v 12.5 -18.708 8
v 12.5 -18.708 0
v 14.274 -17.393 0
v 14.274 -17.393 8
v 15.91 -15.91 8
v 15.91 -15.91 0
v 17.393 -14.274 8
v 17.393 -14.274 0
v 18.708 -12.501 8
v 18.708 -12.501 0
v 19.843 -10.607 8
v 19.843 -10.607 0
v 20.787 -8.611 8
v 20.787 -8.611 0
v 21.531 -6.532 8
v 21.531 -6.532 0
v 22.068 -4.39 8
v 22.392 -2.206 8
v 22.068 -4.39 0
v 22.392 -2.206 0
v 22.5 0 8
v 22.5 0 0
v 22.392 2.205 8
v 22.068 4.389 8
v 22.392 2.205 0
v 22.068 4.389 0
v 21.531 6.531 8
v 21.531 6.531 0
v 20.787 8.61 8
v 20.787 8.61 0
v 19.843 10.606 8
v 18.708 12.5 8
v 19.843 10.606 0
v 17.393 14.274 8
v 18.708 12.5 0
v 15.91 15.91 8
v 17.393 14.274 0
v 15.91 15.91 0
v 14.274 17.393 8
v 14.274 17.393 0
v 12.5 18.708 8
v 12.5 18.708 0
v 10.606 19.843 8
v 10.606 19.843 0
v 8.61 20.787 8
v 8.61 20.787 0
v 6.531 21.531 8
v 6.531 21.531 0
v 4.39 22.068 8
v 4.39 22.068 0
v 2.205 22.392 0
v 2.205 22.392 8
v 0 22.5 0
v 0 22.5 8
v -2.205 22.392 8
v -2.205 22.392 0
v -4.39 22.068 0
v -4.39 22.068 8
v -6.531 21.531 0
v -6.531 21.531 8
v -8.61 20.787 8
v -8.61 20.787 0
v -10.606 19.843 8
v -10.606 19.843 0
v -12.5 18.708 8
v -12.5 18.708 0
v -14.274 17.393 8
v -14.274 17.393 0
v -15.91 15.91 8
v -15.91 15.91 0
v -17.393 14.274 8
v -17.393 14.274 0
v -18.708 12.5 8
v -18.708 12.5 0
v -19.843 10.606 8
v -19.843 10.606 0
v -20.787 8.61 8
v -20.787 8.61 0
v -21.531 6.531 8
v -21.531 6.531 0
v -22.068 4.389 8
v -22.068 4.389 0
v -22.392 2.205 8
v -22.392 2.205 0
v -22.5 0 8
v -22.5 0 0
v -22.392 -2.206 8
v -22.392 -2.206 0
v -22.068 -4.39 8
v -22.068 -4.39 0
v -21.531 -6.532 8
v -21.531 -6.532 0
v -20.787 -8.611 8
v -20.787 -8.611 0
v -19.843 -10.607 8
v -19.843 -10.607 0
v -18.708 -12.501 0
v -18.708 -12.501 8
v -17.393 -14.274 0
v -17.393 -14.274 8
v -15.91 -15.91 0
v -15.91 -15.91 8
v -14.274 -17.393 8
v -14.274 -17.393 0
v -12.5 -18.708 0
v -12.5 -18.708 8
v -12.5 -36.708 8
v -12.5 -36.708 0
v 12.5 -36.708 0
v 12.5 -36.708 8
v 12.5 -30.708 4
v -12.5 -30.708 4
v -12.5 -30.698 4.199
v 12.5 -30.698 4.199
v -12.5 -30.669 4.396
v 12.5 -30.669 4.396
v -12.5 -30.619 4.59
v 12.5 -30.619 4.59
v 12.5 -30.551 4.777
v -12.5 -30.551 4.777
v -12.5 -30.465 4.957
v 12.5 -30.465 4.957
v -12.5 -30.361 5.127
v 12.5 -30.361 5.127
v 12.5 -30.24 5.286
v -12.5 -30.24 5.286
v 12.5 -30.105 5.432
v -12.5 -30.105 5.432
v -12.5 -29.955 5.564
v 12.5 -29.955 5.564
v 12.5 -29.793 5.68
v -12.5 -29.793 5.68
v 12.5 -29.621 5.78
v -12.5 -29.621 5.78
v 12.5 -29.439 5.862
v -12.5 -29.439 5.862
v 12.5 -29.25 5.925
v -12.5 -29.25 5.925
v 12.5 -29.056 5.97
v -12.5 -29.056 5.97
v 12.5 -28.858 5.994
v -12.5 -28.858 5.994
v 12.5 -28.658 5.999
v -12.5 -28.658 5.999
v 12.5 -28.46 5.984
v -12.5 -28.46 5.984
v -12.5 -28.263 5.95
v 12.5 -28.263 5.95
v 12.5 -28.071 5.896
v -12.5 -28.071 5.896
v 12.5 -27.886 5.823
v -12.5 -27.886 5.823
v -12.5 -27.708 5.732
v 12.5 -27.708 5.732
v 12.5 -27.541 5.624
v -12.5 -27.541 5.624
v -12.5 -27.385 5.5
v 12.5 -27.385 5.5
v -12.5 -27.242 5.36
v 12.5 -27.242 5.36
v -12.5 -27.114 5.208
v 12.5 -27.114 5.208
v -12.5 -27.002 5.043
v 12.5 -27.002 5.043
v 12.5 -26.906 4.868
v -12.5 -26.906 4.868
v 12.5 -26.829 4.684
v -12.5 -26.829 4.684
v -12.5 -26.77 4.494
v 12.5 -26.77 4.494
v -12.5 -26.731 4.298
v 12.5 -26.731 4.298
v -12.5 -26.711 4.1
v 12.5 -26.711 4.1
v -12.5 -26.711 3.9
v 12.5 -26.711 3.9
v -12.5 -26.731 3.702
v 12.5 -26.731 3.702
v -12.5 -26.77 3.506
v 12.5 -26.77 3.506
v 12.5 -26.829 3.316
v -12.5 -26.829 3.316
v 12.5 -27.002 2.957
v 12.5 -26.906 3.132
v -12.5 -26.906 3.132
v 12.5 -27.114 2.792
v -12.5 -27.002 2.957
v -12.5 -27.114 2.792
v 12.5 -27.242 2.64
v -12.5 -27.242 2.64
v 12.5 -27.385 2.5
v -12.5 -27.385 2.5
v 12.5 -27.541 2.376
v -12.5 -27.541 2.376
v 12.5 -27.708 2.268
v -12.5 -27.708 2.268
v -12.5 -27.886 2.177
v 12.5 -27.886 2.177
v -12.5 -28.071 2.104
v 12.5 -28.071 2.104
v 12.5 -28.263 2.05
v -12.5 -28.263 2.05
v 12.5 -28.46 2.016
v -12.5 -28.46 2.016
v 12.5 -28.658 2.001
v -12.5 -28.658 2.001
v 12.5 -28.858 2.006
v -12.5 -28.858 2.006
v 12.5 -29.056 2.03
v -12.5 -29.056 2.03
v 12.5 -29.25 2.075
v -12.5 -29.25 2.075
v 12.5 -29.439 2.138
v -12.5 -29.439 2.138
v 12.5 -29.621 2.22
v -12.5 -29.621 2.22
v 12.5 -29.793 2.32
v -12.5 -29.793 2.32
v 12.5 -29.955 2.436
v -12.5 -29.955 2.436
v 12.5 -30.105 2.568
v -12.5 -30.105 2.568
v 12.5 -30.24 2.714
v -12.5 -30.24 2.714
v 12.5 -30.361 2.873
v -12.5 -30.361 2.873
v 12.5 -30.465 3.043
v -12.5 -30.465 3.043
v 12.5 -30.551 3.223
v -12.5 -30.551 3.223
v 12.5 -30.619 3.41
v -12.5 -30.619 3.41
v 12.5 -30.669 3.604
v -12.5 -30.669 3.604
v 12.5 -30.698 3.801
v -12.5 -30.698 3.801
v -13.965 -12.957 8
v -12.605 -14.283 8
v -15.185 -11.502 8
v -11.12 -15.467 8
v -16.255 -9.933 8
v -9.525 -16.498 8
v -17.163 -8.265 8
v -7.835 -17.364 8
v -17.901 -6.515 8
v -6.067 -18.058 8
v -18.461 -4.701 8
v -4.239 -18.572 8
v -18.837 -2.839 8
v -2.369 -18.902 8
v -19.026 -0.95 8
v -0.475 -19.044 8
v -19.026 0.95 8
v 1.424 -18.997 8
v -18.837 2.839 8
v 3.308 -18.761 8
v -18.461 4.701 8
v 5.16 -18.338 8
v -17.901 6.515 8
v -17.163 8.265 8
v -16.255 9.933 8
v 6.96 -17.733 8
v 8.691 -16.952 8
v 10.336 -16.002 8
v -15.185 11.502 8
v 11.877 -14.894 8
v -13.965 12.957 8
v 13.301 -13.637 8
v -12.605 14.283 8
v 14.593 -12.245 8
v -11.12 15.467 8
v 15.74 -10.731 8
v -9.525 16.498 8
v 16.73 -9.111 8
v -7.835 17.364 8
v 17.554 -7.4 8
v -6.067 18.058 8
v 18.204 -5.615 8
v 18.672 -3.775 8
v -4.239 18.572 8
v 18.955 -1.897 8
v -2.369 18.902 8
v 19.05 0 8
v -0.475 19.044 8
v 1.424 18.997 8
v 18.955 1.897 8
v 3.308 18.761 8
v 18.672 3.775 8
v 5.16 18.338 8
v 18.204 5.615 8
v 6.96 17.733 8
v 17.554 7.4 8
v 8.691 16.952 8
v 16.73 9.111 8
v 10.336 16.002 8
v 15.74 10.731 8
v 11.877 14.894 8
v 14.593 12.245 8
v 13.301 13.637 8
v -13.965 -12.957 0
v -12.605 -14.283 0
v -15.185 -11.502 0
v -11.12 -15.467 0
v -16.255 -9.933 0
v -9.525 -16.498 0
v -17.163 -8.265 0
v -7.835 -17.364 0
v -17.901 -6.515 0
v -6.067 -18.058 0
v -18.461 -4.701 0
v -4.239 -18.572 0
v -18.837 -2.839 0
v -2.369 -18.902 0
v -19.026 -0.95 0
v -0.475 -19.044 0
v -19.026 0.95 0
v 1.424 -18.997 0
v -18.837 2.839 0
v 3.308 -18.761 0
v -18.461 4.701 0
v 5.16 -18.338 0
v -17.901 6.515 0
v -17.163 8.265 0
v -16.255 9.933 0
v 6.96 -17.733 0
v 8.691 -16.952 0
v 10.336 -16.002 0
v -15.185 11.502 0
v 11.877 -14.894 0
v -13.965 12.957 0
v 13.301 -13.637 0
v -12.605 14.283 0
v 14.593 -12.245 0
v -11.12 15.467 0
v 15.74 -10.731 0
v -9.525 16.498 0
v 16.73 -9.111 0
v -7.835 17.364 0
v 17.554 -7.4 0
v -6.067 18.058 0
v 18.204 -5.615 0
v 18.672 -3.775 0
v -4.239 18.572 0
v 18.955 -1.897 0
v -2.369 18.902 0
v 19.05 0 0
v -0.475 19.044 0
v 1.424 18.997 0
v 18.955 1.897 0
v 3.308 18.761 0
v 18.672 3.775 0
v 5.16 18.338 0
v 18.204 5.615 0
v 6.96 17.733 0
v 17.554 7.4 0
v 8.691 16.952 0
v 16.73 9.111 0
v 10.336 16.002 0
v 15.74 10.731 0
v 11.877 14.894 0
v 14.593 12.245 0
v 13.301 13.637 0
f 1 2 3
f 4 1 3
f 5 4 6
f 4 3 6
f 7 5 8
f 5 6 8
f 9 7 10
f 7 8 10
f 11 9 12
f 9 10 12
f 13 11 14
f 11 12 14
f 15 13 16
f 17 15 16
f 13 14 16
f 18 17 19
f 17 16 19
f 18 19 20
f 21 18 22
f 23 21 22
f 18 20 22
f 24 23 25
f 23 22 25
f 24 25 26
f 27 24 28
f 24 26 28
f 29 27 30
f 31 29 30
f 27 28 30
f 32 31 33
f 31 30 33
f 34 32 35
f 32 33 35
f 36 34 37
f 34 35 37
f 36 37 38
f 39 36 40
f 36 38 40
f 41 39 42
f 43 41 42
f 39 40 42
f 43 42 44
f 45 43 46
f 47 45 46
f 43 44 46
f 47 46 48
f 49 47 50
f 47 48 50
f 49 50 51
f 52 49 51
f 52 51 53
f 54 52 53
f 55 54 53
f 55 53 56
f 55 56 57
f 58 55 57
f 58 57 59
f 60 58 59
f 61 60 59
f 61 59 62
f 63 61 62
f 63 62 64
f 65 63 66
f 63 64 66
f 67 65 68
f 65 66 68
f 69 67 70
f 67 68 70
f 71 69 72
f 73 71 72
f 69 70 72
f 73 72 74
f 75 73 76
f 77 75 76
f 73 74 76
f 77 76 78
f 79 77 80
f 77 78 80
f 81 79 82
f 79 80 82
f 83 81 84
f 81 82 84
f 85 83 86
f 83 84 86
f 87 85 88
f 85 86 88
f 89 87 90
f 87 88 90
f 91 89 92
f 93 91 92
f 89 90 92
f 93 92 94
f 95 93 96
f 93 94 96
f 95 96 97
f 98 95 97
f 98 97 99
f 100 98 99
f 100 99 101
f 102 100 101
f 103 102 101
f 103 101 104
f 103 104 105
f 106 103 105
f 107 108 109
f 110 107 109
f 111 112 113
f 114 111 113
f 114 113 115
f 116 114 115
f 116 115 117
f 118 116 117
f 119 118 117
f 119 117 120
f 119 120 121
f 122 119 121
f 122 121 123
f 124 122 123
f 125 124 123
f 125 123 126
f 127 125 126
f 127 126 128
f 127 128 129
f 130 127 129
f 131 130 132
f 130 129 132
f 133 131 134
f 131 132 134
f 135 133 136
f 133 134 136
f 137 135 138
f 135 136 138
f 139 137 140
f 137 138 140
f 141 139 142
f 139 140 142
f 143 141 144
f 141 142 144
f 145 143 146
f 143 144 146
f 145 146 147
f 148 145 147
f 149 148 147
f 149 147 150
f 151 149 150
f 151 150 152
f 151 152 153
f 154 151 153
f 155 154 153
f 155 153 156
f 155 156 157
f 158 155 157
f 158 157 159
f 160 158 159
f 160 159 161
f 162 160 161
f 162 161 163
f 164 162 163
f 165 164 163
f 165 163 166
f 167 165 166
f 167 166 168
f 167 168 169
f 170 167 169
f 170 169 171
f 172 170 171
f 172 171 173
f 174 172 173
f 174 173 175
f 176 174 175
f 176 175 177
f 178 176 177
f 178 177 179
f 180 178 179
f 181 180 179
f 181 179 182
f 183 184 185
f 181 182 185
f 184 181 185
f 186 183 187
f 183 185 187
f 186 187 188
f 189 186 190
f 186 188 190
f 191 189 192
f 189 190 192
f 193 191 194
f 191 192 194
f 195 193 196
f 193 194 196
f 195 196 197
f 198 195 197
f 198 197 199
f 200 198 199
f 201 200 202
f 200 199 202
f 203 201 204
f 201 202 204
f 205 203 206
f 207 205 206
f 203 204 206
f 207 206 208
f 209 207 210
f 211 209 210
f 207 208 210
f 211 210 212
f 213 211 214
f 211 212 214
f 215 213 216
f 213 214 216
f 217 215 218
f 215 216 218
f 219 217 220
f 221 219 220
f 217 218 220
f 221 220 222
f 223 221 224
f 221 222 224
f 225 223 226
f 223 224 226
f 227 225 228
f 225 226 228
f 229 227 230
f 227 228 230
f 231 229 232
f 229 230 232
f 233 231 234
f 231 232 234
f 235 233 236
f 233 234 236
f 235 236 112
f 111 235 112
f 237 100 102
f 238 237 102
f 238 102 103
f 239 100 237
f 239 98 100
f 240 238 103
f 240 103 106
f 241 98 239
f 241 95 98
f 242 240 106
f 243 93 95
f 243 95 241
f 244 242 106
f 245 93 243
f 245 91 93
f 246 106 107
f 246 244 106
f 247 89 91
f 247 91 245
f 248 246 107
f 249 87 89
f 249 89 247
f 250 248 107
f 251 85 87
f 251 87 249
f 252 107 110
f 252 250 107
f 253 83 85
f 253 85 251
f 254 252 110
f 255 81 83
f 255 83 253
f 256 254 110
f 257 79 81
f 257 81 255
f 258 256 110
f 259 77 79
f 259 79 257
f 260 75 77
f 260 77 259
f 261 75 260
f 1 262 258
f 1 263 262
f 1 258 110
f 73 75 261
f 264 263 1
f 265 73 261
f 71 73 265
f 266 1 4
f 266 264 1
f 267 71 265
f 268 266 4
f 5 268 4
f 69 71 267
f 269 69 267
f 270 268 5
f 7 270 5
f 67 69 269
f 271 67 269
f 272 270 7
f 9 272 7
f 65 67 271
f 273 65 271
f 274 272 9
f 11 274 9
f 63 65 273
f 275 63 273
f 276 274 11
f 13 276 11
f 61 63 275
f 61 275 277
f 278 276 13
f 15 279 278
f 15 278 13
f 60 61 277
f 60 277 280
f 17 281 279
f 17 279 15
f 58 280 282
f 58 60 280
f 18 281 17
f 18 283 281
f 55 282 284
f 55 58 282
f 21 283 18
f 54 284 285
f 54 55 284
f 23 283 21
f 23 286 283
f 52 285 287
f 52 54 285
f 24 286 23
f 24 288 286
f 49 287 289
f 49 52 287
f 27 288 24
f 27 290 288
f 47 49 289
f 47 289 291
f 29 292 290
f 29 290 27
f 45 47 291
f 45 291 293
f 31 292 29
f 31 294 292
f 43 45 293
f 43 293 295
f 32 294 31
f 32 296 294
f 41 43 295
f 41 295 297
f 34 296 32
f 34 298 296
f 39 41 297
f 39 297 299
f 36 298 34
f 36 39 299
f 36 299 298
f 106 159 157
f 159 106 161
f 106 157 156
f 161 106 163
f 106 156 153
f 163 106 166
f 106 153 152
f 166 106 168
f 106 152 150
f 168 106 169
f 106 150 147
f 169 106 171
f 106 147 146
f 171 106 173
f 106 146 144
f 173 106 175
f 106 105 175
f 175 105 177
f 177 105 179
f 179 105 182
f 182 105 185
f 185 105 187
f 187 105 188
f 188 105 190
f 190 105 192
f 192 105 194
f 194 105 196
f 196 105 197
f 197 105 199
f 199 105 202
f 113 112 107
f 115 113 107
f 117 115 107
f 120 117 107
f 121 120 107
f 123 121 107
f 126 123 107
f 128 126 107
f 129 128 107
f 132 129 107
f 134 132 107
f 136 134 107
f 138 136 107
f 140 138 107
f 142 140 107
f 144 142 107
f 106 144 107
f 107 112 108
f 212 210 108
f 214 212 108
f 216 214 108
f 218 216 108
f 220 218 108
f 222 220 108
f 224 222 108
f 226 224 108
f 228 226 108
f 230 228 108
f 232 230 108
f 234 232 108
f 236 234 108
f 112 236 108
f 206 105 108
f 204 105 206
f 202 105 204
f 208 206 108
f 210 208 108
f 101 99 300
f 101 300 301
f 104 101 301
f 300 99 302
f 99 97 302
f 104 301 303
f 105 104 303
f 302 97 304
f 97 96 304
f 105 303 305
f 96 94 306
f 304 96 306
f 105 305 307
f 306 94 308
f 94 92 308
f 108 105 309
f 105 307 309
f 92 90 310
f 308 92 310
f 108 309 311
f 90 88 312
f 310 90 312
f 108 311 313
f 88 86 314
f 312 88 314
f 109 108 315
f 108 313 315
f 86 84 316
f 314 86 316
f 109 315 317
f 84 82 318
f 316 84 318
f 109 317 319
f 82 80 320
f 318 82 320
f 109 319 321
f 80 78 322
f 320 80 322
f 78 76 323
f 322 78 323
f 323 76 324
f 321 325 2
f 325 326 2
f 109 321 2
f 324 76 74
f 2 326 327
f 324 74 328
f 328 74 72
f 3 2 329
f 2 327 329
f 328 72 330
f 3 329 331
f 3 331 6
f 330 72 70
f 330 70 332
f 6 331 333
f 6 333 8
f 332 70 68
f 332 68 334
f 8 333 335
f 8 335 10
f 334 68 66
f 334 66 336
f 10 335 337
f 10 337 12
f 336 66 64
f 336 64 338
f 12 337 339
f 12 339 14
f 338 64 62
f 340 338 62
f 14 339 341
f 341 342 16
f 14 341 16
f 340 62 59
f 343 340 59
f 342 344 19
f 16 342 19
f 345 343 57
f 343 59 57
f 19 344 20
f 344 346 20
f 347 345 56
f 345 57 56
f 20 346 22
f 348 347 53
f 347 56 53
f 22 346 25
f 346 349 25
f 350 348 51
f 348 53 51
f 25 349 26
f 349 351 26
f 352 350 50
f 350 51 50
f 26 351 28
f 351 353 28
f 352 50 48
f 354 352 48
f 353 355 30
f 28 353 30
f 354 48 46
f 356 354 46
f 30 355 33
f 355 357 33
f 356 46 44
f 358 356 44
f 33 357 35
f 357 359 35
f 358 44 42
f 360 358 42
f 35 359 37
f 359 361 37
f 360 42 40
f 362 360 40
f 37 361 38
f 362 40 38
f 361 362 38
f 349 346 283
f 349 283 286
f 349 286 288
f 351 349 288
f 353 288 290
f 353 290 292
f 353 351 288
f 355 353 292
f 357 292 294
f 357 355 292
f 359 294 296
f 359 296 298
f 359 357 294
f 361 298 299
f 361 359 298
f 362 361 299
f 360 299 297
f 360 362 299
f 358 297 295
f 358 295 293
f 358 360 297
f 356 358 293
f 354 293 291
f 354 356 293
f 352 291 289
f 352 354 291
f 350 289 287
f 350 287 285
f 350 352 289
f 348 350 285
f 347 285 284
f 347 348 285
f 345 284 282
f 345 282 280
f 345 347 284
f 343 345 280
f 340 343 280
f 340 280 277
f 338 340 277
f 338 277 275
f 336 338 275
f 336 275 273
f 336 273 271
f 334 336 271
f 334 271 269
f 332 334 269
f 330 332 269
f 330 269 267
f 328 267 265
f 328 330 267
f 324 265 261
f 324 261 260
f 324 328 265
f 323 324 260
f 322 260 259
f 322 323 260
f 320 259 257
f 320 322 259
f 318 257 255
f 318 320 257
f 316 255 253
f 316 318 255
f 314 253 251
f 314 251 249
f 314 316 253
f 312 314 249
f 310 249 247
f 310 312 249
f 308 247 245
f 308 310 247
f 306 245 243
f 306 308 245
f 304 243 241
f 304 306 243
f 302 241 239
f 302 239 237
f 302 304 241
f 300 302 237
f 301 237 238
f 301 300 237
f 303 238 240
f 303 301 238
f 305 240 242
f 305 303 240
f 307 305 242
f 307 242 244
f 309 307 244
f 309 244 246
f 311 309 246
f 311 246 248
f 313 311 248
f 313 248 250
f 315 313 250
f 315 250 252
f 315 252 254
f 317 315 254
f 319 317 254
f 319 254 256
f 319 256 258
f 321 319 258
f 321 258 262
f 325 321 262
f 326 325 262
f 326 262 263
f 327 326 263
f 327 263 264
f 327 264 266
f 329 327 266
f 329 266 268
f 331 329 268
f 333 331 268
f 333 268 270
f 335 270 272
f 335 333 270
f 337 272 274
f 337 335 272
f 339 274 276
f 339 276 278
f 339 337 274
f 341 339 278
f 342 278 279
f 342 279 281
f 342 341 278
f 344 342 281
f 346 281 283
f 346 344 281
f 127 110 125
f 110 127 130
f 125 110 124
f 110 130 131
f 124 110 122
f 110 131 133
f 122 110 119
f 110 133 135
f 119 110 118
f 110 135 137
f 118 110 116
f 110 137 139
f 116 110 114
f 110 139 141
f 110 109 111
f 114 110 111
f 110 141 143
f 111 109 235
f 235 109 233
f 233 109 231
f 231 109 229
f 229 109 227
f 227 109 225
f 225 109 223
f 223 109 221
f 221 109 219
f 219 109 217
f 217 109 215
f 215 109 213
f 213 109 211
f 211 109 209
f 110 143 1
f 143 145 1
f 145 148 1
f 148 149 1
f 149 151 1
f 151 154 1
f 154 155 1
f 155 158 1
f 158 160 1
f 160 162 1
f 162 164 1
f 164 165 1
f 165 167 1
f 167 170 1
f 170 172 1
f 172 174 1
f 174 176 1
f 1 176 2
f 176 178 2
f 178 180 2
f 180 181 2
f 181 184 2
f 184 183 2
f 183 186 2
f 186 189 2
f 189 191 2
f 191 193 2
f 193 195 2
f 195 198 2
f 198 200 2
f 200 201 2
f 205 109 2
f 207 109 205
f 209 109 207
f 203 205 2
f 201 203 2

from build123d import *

# Parameters (mm, degrees)
SKETCH_1_R          = 19.05
EXTRUDE_1_DEPTH     = 8
CUT_EXTRUDE_1_REACH = 53.347
SKETCH_2_R          = 2


with BuildPart() as part:
    # 스케치1 → 보스-돌출1 (new body)
    with BuildSketch(Plane.XY):
        with BuildLine():
            Line((-12.5, -18.708286934), (-12.5, -36.708286934))
            Line((-12.5, -36.708286934), (12.5, -36.708286934))
            Line((12.5, -36.708286934), (12.5, -18.708286934))
            ThreePointArc((12.5, -18.708286934), (0, 22.5), (-12.5, -18.708286934))
        make_face()
        Circle(SKETCH_1_R, mode=Mode.SUBTRACT)
    extrude(amount=EXTRUDE_1_DEPTH)

    # 스케치2 → 컷-돌출1 (cut, up to next)
    with BuildSketch(Plane.ZY.offset(12.5), mode=Mode.PRIVATE) as cut_extrude_1_sk1:
        with Locations(Location((4, -28.708286934, 0), (0, 0, 270))):
            Circle(SKETCH_2_R)
    cut_extrude_1_tool1 = extrude(cut_extrude_1_sk1.sketch, amount=-CUT_EXTRUDE_1_REACH, mode=Mode.PRIVATE) & part.part
    add(cut_extrude_1_tool1.solids().sort_by_distance((-12.5, -28.708287, 4))[0], mode=Mode.SUBTRACT)


solid = part.part
